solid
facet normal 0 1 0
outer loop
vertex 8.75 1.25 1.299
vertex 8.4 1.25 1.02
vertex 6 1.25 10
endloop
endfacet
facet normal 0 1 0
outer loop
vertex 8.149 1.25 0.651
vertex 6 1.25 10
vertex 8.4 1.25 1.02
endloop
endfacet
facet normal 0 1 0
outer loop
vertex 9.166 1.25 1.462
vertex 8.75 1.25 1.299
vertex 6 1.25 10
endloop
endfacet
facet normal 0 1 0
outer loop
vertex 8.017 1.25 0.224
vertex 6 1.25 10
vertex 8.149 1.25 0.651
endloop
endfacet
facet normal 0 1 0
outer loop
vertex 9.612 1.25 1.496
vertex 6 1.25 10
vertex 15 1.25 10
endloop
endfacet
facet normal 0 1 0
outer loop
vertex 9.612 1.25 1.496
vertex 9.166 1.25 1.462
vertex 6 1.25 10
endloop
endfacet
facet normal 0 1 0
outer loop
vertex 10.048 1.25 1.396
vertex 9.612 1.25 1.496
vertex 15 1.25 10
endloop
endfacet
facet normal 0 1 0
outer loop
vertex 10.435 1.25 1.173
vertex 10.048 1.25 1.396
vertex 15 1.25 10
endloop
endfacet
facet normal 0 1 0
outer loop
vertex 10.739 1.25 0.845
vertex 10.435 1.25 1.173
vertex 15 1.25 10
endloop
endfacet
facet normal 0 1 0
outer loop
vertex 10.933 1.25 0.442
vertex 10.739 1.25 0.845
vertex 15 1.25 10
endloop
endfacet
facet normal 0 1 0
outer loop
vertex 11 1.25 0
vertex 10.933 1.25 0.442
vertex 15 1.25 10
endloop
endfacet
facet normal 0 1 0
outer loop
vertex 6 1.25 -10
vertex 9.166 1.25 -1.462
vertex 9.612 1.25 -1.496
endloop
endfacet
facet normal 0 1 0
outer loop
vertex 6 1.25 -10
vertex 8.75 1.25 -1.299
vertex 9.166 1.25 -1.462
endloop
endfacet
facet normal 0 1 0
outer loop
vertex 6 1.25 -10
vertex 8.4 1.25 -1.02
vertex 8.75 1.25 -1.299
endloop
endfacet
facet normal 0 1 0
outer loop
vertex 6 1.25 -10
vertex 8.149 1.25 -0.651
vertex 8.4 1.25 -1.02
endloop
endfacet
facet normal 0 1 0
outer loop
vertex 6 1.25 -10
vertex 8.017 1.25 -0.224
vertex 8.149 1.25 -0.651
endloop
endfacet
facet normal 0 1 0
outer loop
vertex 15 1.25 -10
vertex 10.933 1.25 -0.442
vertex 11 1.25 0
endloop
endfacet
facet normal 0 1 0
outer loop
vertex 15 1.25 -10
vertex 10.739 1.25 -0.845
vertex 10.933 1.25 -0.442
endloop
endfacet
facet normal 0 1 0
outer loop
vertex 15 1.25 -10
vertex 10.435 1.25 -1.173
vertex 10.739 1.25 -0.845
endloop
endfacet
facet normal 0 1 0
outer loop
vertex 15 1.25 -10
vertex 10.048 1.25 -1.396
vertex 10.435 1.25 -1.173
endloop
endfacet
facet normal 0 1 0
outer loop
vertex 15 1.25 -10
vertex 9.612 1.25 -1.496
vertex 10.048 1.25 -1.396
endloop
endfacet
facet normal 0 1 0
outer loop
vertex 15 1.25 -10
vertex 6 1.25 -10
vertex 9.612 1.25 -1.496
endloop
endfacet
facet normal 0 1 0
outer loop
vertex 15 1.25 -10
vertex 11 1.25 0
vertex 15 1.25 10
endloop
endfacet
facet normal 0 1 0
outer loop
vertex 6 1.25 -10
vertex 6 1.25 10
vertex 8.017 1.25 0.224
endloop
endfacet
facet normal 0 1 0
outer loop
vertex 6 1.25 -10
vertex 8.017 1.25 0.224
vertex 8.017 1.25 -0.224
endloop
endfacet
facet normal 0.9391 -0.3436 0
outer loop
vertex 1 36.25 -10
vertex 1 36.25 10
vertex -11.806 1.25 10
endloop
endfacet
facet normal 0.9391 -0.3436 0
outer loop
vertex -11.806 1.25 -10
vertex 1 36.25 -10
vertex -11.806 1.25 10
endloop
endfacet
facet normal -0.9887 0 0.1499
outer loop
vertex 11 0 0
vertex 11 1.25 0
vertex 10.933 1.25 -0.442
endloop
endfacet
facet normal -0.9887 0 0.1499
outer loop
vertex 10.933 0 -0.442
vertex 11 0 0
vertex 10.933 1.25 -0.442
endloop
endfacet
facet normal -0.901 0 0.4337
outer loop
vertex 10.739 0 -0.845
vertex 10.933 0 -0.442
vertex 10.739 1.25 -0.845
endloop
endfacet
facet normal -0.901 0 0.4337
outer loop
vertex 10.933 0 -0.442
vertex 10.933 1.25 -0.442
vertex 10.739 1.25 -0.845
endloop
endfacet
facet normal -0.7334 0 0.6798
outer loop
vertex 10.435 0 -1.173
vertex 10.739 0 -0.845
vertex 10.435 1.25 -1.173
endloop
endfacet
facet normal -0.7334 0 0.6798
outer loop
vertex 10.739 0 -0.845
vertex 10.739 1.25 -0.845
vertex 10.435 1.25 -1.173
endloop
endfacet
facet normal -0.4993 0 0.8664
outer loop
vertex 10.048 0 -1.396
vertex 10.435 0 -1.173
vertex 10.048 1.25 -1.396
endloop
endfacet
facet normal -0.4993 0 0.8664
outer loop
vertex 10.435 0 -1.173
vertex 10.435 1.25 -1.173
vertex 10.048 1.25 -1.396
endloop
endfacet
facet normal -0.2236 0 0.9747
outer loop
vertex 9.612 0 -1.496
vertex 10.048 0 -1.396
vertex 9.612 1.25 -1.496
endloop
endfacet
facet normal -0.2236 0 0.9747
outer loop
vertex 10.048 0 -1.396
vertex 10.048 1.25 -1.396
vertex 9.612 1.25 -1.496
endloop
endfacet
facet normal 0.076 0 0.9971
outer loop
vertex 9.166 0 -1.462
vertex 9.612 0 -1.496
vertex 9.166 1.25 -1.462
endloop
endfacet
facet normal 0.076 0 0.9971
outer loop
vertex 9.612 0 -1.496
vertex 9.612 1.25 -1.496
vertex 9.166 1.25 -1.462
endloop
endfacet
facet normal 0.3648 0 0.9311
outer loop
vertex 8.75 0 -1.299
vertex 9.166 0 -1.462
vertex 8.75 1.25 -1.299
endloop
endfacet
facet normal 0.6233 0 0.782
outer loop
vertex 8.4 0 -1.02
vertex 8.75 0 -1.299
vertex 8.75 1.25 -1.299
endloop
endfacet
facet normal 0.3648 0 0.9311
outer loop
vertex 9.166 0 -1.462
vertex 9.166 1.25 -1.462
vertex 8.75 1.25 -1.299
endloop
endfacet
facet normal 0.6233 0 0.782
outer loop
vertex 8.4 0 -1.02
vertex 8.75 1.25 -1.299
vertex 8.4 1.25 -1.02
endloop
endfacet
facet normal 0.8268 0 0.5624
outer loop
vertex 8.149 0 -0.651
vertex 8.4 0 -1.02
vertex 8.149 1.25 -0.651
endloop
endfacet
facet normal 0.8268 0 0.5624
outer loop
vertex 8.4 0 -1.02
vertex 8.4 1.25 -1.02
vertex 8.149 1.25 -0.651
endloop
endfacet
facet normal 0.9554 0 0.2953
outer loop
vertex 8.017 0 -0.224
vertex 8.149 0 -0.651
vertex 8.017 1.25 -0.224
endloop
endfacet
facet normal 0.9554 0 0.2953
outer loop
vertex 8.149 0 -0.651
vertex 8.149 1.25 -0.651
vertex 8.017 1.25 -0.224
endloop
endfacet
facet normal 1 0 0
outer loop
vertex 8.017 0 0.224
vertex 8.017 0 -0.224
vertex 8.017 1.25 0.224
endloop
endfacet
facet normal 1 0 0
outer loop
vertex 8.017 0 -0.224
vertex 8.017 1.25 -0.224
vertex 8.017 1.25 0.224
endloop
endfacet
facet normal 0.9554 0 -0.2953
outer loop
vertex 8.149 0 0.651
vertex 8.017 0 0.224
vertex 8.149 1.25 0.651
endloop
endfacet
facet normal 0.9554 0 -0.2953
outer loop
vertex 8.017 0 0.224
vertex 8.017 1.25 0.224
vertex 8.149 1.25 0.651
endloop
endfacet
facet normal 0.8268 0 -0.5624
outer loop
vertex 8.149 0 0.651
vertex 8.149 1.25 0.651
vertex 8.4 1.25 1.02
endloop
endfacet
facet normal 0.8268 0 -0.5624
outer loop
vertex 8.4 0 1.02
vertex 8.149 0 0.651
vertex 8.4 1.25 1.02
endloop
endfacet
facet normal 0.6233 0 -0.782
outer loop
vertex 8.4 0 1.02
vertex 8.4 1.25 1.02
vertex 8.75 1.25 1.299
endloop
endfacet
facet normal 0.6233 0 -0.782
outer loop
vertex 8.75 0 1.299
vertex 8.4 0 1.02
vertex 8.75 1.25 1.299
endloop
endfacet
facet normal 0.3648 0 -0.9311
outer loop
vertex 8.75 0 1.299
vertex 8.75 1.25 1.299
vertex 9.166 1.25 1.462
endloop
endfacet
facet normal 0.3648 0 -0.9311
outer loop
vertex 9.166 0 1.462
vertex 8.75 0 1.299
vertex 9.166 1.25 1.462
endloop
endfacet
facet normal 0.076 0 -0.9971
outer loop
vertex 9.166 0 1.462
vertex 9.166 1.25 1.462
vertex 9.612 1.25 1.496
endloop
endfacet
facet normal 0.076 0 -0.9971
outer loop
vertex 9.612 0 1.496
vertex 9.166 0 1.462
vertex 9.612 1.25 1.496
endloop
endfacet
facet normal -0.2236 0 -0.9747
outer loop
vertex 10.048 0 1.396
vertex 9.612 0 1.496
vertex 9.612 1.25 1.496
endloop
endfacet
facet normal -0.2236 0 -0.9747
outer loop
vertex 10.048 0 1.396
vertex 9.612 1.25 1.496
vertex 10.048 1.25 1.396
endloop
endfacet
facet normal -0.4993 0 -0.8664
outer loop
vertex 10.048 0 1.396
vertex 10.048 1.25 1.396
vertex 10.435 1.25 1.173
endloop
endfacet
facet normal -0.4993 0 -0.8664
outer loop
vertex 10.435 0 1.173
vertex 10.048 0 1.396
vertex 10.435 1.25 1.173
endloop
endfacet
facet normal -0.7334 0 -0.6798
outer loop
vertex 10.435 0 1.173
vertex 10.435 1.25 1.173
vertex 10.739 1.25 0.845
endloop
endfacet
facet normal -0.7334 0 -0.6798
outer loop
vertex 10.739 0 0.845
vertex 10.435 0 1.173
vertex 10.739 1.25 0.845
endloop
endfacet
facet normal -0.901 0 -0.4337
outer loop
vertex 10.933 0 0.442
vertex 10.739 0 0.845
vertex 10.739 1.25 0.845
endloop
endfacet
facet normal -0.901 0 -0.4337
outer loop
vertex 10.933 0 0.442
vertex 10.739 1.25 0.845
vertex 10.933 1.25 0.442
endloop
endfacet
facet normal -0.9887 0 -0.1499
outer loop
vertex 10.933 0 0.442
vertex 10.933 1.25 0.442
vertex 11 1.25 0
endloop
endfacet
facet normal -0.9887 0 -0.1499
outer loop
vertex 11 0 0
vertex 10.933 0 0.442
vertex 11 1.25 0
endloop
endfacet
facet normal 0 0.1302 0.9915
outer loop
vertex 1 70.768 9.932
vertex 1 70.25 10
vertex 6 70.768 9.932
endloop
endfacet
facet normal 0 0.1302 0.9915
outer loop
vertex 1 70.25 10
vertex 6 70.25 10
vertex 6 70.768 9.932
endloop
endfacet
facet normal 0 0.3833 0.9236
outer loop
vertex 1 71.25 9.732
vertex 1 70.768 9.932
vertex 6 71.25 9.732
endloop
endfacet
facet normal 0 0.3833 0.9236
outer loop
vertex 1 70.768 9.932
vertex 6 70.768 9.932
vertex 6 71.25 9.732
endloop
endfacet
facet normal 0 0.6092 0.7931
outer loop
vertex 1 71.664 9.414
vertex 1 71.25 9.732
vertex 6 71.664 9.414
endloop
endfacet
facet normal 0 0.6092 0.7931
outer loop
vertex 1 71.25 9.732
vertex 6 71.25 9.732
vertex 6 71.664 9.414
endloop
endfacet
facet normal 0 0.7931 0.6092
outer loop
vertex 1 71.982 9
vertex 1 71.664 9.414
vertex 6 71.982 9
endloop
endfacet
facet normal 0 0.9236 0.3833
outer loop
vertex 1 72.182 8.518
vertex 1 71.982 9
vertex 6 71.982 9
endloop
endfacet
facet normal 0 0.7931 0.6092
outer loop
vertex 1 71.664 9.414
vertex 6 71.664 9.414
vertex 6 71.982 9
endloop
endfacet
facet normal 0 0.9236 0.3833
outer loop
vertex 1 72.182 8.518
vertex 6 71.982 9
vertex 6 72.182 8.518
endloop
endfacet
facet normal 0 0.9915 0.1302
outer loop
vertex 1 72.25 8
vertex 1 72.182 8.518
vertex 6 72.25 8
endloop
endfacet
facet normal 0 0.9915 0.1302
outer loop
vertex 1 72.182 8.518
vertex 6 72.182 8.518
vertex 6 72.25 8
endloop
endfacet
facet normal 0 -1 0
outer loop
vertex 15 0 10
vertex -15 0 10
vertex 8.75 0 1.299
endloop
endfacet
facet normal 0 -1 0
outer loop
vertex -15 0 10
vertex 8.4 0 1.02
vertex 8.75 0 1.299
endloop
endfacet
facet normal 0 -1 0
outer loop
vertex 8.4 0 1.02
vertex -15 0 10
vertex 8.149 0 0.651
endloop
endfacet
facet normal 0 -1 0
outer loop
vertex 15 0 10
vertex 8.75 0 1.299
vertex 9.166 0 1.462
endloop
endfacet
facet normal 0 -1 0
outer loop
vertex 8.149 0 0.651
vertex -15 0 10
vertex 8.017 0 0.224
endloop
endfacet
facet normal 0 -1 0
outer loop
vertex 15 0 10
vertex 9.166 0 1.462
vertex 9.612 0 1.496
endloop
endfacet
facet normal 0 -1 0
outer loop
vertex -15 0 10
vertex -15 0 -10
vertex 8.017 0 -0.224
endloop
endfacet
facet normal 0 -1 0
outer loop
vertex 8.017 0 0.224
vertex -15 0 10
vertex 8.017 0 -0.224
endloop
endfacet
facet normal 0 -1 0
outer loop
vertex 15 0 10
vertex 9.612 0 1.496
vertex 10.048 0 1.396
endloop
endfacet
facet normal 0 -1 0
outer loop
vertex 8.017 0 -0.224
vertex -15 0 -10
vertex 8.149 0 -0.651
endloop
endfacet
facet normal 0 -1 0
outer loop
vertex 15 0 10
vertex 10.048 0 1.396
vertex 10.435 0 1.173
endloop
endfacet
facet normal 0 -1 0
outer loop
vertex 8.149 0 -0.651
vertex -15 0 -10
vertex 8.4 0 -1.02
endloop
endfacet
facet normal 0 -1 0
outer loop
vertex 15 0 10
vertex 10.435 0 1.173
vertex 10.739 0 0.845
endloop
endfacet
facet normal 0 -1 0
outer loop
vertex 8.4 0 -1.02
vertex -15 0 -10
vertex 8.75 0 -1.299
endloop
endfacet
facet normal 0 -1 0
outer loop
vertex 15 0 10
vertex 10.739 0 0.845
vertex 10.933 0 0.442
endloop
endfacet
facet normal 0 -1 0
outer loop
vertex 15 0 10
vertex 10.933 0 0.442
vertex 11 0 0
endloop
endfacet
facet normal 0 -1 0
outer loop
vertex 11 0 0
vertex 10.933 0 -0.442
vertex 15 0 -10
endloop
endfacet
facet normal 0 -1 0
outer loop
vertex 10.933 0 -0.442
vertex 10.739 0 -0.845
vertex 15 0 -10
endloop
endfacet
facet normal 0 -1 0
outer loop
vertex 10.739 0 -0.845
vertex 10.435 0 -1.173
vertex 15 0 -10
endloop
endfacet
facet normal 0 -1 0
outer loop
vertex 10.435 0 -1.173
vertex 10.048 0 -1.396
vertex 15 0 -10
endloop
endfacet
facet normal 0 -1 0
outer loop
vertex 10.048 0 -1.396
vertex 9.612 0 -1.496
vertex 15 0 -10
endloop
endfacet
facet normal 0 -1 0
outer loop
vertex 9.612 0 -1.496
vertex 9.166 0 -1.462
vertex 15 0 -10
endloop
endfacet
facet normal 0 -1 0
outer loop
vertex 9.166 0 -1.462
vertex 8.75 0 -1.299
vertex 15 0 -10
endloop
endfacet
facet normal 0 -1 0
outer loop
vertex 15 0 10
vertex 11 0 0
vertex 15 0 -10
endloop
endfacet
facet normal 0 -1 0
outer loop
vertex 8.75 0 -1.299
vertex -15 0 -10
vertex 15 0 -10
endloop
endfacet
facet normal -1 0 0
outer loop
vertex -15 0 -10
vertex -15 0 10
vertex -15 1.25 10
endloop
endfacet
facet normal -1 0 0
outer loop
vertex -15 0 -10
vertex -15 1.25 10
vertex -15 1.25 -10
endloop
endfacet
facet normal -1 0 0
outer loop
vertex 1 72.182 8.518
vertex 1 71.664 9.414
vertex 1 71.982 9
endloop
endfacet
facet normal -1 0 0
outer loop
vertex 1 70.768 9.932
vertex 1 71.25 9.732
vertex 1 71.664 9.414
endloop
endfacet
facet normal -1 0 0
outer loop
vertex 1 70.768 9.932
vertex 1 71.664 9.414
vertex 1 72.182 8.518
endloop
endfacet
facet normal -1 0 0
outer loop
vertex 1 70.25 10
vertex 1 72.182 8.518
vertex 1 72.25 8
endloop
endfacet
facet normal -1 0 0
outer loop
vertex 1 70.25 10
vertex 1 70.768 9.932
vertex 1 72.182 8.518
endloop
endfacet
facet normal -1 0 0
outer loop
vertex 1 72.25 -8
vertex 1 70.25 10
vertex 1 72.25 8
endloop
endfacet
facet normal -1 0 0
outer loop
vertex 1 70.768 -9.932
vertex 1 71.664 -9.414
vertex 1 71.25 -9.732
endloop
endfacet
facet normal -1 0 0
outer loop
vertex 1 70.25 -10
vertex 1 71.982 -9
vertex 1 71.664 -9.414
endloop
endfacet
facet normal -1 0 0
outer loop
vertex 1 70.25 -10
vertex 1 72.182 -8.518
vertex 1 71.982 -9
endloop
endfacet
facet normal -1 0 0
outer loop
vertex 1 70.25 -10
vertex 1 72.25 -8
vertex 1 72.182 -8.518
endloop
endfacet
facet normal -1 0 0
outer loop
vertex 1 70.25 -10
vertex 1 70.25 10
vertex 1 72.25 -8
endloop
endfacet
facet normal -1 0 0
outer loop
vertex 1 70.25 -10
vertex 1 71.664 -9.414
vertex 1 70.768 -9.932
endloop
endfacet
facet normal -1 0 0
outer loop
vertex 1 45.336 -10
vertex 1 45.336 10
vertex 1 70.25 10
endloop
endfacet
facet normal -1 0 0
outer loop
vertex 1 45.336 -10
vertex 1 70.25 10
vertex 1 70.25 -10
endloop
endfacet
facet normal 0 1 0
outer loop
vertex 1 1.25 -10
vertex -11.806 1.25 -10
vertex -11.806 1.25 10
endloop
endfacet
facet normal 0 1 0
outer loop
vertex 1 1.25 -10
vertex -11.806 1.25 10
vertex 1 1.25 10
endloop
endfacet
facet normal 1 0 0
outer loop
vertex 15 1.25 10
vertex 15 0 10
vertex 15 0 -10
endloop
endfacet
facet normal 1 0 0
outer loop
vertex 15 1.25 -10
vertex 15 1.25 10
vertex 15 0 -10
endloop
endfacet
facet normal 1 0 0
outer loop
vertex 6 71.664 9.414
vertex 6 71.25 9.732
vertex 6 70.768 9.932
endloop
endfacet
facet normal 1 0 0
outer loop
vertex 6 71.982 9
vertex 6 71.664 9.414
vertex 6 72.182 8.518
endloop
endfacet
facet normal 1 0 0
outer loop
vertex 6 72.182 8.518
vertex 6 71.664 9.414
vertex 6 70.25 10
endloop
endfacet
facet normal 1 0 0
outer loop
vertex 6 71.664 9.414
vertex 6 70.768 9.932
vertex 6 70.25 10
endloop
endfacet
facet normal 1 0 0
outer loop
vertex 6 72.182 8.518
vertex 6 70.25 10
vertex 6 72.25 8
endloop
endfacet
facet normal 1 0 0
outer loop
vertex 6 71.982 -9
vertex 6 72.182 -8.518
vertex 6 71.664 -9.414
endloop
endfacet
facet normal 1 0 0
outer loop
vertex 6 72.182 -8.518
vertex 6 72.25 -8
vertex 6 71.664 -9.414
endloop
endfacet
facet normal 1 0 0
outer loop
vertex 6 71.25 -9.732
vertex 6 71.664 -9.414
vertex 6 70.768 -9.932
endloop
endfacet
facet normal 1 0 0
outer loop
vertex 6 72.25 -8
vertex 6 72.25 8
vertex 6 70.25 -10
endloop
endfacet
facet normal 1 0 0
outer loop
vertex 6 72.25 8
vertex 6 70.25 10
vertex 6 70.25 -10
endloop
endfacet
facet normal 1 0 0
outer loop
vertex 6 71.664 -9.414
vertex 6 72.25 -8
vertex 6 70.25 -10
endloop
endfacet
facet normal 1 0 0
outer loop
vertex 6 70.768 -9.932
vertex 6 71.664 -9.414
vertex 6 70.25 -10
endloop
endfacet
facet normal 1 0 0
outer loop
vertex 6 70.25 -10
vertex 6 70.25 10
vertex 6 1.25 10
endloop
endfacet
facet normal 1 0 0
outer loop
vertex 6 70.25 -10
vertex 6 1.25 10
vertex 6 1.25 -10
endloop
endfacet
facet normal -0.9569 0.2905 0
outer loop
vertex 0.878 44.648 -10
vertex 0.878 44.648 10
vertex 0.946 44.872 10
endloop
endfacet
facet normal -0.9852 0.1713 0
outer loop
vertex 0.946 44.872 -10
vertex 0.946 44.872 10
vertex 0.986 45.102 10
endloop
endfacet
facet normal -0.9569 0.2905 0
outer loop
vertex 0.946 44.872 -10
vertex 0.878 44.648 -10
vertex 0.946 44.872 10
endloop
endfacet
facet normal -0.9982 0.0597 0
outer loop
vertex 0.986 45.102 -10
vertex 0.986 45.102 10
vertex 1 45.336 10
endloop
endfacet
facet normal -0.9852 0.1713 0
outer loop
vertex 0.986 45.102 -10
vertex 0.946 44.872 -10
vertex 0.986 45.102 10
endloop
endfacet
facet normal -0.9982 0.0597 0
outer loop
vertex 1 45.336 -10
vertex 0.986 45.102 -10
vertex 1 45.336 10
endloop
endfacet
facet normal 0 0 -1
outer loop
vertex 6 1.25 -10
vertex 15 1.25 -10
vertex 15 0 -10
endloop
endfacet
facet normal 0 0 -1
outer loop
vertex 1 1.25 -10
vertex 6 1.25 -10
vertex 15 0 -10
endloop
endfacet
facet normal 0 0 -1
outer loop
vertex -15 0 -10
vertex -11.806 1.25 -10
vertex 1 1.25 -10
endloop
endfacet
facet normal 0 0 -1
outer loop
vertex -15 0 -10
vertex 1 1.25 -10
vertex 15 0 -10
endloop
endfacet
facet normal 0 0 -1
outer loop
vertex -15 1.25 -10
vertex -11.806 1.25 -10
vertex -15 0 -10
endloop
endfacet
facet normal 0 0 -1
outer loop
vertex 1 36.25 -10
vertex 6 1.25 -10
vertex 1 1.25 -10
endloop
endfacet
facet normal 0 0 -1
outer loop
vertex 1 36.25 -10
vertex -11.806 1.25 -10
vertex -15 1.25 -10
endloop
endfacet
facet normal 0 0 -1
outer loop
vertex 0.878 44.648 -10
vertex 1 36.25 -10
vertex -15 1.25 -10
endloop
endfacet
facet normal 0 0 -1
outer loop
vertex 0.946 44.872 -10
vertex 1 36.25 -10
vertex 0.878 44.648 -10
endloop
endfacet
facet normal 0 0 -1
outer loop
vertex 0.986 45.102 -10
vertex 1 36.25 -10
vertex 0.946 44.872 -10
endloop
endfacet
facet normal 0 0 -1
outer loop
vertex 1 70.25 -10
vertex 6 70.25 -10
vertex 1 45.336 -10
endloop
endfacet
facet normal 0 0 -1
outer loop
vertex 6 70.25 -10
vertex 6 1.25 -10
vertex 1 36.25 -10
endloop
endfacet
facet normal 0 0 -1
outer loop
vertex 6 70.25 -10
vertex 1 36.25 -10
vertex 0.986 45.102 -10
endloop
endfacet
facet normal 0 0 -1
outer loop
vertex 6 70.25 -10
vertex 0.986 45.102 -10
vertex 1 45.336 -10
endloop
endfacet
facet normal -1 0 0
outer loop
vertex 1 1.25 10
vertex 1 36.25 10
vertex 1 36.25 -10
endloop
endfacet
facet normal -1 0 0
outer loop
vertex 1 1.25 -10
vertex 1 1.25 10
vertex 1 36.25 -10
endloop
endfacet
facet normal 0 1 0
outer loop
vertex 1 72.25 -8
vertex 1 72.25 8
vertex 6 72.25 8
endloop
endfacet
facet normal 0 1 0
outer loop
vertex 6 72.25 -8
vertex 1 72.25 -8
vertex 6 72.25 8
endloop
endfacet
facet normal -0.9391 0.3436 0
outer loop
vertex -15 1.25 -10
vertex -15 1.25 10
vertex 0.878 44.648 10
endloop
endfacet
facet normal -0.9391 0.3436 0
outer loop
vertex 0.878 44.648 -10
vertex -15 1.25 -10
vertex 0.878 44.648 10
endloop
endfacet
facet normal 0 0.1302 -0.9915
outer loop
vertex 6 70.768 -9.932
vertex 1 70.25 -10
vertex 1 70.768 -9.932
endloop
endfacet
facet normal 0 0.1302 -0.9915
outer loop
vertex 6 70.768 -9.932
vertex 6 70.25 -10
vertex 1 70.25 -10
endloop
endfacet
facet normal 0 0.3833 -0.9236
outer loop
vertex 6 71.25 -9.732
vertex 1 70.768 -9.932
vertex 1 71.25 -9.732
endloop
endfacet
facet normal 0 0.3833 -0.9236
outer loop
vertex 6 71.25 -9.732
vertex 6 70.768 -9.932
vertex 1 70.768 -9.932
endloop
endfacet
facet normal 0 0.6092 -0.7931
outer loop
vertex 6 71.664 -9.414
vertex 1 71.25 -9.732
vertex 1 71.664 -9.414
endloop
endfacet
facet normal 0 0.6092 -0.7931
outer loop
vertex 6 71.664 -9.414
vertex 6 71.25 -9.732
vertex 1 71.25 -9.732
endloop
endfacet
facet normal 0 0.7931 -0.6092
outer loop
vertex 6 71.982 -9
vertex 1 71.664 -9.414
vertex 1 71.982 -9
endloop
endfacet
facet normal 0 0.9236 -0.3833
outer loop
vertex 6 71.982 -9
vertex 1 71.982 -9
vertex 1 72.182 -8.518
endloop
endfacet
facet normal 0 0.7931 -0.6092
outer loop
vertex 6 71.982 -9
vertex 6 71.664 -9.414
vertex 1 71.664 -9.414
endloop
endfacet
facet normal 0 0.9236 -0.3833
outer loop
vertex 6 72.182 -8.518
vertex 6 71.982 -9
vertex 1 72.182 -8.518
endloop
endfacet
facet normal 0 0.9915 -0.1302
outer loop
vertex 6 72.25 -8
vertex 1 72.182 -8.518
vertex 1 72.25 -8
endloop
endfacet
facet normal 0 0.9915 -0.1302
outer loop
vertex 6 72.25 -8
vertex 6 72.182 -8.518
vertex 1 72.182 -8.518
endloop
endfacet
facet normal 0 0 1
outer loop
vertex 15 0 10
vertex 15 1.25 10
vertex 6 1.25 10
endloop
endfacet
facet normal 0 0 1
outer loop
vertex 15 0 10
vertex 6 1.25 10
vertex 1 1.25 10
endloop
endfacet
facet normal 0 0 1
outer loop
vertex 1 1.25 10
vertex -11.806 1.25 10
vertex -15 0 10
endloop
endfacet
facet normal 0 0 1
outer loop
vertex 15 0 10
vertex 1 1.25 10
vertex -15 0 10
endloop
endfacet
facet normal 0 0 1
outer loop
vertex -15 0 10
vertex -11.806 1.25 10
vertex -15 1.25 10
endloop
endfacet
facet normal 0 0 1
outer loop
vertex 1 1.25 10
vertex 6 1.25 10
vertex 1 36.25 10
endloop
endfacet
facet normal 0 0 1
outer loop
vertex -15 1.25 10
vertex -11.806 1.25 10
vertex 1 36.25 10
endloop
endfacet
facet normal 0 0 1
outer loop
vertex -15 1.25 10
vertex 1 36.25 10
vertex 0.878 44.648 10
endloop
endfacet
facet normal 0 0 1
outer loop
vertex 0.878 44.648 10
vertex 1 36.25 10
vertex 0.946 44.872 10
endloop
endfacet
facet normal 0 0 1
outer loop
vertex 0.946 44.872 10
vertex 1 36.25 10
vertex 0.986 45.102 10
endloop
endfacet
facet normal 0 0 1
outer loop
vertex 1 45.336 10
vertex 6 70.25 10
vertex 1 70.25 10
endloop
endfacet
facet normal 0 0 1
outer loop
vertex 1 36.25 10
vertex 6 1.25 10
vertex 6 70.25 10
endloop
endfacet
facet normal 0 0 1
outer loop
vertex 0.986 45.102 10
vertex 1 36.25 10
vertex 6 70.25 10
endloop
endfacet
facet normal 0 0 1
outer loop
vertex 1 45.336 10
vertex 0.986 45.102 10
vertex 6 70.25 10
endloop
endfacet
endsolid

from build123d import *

# Parameters (mm, degrees)
SKETCH1_W           = 30
SKETCH1_H           = 20
BOSS_EXTRUDE1_DEPTH = 1.25
SKETCH2_W           = 5
SKETCH2_H           = 20
BOSS_EXTRUDE2_DEPTH = 71
BOSS_EXTRUDE3_DEPTH = 20
CUT_EXTRUDE2_REACH  = 3.25
SKETCH4_R           = 1.5
FILLET1_R           = 2


with BuildPart() as part:
    # Sketch1 → Boss-Extrude1 (new body)
    with BuildSketch(Plane(origin=(0, 0, 0), x_dir=(1, 0, 0), z_dir=(0, 1, 0))):
        Rectangle(SKETCH1_W, SKETCH1_H)
    extrude(amount=BOSS_EXTRUDE1_DEPTH)

    # Sketch2 → Boss-Extrude2 (add)
    with BuildSketch(Plane(origin=(0, 1.25, 0), x_dir=(1, 0, 0), z_dir=(0, 1, 0))):
        with Locations((3.5, 0)):
            Rectangle(SKETCH2_W, SKETCH2_H)
    extrude(amount=BOSS_EXTRUDE2_DEPTH)

    # Sketch3 → Boss-Extrude3 (add)
    with BuildSketch(Plane.XY.offset(10)):
        Polygon((1, 36.25), (-11.805511119, 1.25), (-15, 1.25), (1, 44.981171275), align=None)
    extrude(amount=-BOSS_EXTRUDE3_DEPTH)

    # Sketch4 → Cut-Extrude2 (cut, up to next)
    with BuildSketch(Plane(origin=(0, 1.25, 0), x_dir=(1, 0, 0), z_dir=(0, 1, 0)), mode=Mode.PRIVATE) as cut_extrude2_sk1:
        with Locations((9.5, 0)):
            Circle(SKETCH4_R)
    cut_extrude2_tool1 = extrude(cut_extrude2_sk1.sketch, amount=-CUT_EXTRUDE2_REACH, mode=Mode.PRIVATE) & part.part
    add(cut_extrude2_tool1.solids().sort_by_distance((9.5, 1.25, 0))[0], mode=Mode.SUBTRACT)

    # Fillet1
    fillet1_edges = [part.edges().sort_by_distance(p)[0] for p in [
        (3.5, 72.25, -10),
        (3.5, 72.25, 10),
        (1, 44.981171275, 0),
    ]]
    fillet(fillet1_edges, radius=FILLET1_R)


solid = part.part
